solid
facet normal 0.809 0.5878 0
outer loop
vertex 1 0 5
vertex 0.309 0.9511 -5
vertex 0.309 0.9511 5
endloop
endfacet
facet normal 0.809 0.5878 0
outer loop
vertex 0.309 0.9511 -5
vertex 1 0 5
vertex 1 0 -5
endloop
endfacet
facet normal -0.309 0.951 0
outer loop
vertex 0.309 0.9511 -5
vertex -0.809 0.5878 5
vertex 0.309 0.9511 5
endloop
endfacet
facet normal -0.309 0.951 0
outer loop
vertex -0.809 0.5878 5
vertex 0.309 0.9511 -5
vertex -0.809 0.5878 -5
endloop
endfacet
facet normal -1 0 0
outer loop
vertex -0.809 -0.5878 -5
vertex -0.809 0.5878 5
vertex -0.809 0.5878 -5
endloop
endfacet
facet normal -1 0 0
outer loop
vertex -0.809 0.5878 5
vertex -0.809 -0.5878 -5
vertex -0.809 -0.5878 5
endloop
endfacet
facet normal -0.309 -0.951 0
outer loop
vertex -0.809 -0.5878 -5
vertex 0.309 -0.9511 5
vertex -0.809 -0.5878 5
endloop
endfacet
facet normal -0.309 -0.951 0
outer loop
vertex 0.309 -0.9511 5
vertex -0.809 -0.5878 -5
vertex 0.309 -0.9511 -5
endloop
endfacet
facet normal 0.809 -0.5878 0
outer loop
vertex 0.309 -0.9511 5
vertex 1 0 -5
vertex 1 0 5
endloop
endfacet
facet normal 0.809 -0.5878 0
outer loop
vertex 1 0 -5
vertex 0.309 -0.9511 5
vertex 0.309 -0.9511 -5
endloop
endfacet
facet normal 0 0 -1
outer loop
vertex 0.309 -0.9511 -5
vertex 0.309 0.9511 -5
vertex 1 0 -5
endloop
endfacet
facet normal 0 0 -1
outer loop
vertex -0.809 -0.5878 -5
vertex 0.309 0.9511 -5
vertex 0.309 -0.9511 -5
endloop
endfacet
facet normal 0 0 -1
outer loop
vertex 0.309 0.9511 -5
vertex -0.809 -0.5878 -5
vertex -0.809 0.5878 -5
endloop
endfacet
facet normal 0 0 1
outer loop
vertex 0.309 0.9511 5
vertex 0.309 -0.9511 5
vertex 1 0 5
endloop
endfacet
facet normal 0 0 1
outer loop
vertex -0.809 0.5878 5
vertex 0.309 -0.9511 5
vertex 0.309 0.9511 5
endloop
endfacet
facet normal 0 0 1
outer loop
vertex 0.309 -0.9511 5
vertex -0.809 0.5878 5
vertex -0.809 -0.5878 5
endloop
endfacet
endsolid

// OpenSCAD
// Unit of length: Unit.MM
cylinder(h = 10.0, d = 2.0, center = true);
